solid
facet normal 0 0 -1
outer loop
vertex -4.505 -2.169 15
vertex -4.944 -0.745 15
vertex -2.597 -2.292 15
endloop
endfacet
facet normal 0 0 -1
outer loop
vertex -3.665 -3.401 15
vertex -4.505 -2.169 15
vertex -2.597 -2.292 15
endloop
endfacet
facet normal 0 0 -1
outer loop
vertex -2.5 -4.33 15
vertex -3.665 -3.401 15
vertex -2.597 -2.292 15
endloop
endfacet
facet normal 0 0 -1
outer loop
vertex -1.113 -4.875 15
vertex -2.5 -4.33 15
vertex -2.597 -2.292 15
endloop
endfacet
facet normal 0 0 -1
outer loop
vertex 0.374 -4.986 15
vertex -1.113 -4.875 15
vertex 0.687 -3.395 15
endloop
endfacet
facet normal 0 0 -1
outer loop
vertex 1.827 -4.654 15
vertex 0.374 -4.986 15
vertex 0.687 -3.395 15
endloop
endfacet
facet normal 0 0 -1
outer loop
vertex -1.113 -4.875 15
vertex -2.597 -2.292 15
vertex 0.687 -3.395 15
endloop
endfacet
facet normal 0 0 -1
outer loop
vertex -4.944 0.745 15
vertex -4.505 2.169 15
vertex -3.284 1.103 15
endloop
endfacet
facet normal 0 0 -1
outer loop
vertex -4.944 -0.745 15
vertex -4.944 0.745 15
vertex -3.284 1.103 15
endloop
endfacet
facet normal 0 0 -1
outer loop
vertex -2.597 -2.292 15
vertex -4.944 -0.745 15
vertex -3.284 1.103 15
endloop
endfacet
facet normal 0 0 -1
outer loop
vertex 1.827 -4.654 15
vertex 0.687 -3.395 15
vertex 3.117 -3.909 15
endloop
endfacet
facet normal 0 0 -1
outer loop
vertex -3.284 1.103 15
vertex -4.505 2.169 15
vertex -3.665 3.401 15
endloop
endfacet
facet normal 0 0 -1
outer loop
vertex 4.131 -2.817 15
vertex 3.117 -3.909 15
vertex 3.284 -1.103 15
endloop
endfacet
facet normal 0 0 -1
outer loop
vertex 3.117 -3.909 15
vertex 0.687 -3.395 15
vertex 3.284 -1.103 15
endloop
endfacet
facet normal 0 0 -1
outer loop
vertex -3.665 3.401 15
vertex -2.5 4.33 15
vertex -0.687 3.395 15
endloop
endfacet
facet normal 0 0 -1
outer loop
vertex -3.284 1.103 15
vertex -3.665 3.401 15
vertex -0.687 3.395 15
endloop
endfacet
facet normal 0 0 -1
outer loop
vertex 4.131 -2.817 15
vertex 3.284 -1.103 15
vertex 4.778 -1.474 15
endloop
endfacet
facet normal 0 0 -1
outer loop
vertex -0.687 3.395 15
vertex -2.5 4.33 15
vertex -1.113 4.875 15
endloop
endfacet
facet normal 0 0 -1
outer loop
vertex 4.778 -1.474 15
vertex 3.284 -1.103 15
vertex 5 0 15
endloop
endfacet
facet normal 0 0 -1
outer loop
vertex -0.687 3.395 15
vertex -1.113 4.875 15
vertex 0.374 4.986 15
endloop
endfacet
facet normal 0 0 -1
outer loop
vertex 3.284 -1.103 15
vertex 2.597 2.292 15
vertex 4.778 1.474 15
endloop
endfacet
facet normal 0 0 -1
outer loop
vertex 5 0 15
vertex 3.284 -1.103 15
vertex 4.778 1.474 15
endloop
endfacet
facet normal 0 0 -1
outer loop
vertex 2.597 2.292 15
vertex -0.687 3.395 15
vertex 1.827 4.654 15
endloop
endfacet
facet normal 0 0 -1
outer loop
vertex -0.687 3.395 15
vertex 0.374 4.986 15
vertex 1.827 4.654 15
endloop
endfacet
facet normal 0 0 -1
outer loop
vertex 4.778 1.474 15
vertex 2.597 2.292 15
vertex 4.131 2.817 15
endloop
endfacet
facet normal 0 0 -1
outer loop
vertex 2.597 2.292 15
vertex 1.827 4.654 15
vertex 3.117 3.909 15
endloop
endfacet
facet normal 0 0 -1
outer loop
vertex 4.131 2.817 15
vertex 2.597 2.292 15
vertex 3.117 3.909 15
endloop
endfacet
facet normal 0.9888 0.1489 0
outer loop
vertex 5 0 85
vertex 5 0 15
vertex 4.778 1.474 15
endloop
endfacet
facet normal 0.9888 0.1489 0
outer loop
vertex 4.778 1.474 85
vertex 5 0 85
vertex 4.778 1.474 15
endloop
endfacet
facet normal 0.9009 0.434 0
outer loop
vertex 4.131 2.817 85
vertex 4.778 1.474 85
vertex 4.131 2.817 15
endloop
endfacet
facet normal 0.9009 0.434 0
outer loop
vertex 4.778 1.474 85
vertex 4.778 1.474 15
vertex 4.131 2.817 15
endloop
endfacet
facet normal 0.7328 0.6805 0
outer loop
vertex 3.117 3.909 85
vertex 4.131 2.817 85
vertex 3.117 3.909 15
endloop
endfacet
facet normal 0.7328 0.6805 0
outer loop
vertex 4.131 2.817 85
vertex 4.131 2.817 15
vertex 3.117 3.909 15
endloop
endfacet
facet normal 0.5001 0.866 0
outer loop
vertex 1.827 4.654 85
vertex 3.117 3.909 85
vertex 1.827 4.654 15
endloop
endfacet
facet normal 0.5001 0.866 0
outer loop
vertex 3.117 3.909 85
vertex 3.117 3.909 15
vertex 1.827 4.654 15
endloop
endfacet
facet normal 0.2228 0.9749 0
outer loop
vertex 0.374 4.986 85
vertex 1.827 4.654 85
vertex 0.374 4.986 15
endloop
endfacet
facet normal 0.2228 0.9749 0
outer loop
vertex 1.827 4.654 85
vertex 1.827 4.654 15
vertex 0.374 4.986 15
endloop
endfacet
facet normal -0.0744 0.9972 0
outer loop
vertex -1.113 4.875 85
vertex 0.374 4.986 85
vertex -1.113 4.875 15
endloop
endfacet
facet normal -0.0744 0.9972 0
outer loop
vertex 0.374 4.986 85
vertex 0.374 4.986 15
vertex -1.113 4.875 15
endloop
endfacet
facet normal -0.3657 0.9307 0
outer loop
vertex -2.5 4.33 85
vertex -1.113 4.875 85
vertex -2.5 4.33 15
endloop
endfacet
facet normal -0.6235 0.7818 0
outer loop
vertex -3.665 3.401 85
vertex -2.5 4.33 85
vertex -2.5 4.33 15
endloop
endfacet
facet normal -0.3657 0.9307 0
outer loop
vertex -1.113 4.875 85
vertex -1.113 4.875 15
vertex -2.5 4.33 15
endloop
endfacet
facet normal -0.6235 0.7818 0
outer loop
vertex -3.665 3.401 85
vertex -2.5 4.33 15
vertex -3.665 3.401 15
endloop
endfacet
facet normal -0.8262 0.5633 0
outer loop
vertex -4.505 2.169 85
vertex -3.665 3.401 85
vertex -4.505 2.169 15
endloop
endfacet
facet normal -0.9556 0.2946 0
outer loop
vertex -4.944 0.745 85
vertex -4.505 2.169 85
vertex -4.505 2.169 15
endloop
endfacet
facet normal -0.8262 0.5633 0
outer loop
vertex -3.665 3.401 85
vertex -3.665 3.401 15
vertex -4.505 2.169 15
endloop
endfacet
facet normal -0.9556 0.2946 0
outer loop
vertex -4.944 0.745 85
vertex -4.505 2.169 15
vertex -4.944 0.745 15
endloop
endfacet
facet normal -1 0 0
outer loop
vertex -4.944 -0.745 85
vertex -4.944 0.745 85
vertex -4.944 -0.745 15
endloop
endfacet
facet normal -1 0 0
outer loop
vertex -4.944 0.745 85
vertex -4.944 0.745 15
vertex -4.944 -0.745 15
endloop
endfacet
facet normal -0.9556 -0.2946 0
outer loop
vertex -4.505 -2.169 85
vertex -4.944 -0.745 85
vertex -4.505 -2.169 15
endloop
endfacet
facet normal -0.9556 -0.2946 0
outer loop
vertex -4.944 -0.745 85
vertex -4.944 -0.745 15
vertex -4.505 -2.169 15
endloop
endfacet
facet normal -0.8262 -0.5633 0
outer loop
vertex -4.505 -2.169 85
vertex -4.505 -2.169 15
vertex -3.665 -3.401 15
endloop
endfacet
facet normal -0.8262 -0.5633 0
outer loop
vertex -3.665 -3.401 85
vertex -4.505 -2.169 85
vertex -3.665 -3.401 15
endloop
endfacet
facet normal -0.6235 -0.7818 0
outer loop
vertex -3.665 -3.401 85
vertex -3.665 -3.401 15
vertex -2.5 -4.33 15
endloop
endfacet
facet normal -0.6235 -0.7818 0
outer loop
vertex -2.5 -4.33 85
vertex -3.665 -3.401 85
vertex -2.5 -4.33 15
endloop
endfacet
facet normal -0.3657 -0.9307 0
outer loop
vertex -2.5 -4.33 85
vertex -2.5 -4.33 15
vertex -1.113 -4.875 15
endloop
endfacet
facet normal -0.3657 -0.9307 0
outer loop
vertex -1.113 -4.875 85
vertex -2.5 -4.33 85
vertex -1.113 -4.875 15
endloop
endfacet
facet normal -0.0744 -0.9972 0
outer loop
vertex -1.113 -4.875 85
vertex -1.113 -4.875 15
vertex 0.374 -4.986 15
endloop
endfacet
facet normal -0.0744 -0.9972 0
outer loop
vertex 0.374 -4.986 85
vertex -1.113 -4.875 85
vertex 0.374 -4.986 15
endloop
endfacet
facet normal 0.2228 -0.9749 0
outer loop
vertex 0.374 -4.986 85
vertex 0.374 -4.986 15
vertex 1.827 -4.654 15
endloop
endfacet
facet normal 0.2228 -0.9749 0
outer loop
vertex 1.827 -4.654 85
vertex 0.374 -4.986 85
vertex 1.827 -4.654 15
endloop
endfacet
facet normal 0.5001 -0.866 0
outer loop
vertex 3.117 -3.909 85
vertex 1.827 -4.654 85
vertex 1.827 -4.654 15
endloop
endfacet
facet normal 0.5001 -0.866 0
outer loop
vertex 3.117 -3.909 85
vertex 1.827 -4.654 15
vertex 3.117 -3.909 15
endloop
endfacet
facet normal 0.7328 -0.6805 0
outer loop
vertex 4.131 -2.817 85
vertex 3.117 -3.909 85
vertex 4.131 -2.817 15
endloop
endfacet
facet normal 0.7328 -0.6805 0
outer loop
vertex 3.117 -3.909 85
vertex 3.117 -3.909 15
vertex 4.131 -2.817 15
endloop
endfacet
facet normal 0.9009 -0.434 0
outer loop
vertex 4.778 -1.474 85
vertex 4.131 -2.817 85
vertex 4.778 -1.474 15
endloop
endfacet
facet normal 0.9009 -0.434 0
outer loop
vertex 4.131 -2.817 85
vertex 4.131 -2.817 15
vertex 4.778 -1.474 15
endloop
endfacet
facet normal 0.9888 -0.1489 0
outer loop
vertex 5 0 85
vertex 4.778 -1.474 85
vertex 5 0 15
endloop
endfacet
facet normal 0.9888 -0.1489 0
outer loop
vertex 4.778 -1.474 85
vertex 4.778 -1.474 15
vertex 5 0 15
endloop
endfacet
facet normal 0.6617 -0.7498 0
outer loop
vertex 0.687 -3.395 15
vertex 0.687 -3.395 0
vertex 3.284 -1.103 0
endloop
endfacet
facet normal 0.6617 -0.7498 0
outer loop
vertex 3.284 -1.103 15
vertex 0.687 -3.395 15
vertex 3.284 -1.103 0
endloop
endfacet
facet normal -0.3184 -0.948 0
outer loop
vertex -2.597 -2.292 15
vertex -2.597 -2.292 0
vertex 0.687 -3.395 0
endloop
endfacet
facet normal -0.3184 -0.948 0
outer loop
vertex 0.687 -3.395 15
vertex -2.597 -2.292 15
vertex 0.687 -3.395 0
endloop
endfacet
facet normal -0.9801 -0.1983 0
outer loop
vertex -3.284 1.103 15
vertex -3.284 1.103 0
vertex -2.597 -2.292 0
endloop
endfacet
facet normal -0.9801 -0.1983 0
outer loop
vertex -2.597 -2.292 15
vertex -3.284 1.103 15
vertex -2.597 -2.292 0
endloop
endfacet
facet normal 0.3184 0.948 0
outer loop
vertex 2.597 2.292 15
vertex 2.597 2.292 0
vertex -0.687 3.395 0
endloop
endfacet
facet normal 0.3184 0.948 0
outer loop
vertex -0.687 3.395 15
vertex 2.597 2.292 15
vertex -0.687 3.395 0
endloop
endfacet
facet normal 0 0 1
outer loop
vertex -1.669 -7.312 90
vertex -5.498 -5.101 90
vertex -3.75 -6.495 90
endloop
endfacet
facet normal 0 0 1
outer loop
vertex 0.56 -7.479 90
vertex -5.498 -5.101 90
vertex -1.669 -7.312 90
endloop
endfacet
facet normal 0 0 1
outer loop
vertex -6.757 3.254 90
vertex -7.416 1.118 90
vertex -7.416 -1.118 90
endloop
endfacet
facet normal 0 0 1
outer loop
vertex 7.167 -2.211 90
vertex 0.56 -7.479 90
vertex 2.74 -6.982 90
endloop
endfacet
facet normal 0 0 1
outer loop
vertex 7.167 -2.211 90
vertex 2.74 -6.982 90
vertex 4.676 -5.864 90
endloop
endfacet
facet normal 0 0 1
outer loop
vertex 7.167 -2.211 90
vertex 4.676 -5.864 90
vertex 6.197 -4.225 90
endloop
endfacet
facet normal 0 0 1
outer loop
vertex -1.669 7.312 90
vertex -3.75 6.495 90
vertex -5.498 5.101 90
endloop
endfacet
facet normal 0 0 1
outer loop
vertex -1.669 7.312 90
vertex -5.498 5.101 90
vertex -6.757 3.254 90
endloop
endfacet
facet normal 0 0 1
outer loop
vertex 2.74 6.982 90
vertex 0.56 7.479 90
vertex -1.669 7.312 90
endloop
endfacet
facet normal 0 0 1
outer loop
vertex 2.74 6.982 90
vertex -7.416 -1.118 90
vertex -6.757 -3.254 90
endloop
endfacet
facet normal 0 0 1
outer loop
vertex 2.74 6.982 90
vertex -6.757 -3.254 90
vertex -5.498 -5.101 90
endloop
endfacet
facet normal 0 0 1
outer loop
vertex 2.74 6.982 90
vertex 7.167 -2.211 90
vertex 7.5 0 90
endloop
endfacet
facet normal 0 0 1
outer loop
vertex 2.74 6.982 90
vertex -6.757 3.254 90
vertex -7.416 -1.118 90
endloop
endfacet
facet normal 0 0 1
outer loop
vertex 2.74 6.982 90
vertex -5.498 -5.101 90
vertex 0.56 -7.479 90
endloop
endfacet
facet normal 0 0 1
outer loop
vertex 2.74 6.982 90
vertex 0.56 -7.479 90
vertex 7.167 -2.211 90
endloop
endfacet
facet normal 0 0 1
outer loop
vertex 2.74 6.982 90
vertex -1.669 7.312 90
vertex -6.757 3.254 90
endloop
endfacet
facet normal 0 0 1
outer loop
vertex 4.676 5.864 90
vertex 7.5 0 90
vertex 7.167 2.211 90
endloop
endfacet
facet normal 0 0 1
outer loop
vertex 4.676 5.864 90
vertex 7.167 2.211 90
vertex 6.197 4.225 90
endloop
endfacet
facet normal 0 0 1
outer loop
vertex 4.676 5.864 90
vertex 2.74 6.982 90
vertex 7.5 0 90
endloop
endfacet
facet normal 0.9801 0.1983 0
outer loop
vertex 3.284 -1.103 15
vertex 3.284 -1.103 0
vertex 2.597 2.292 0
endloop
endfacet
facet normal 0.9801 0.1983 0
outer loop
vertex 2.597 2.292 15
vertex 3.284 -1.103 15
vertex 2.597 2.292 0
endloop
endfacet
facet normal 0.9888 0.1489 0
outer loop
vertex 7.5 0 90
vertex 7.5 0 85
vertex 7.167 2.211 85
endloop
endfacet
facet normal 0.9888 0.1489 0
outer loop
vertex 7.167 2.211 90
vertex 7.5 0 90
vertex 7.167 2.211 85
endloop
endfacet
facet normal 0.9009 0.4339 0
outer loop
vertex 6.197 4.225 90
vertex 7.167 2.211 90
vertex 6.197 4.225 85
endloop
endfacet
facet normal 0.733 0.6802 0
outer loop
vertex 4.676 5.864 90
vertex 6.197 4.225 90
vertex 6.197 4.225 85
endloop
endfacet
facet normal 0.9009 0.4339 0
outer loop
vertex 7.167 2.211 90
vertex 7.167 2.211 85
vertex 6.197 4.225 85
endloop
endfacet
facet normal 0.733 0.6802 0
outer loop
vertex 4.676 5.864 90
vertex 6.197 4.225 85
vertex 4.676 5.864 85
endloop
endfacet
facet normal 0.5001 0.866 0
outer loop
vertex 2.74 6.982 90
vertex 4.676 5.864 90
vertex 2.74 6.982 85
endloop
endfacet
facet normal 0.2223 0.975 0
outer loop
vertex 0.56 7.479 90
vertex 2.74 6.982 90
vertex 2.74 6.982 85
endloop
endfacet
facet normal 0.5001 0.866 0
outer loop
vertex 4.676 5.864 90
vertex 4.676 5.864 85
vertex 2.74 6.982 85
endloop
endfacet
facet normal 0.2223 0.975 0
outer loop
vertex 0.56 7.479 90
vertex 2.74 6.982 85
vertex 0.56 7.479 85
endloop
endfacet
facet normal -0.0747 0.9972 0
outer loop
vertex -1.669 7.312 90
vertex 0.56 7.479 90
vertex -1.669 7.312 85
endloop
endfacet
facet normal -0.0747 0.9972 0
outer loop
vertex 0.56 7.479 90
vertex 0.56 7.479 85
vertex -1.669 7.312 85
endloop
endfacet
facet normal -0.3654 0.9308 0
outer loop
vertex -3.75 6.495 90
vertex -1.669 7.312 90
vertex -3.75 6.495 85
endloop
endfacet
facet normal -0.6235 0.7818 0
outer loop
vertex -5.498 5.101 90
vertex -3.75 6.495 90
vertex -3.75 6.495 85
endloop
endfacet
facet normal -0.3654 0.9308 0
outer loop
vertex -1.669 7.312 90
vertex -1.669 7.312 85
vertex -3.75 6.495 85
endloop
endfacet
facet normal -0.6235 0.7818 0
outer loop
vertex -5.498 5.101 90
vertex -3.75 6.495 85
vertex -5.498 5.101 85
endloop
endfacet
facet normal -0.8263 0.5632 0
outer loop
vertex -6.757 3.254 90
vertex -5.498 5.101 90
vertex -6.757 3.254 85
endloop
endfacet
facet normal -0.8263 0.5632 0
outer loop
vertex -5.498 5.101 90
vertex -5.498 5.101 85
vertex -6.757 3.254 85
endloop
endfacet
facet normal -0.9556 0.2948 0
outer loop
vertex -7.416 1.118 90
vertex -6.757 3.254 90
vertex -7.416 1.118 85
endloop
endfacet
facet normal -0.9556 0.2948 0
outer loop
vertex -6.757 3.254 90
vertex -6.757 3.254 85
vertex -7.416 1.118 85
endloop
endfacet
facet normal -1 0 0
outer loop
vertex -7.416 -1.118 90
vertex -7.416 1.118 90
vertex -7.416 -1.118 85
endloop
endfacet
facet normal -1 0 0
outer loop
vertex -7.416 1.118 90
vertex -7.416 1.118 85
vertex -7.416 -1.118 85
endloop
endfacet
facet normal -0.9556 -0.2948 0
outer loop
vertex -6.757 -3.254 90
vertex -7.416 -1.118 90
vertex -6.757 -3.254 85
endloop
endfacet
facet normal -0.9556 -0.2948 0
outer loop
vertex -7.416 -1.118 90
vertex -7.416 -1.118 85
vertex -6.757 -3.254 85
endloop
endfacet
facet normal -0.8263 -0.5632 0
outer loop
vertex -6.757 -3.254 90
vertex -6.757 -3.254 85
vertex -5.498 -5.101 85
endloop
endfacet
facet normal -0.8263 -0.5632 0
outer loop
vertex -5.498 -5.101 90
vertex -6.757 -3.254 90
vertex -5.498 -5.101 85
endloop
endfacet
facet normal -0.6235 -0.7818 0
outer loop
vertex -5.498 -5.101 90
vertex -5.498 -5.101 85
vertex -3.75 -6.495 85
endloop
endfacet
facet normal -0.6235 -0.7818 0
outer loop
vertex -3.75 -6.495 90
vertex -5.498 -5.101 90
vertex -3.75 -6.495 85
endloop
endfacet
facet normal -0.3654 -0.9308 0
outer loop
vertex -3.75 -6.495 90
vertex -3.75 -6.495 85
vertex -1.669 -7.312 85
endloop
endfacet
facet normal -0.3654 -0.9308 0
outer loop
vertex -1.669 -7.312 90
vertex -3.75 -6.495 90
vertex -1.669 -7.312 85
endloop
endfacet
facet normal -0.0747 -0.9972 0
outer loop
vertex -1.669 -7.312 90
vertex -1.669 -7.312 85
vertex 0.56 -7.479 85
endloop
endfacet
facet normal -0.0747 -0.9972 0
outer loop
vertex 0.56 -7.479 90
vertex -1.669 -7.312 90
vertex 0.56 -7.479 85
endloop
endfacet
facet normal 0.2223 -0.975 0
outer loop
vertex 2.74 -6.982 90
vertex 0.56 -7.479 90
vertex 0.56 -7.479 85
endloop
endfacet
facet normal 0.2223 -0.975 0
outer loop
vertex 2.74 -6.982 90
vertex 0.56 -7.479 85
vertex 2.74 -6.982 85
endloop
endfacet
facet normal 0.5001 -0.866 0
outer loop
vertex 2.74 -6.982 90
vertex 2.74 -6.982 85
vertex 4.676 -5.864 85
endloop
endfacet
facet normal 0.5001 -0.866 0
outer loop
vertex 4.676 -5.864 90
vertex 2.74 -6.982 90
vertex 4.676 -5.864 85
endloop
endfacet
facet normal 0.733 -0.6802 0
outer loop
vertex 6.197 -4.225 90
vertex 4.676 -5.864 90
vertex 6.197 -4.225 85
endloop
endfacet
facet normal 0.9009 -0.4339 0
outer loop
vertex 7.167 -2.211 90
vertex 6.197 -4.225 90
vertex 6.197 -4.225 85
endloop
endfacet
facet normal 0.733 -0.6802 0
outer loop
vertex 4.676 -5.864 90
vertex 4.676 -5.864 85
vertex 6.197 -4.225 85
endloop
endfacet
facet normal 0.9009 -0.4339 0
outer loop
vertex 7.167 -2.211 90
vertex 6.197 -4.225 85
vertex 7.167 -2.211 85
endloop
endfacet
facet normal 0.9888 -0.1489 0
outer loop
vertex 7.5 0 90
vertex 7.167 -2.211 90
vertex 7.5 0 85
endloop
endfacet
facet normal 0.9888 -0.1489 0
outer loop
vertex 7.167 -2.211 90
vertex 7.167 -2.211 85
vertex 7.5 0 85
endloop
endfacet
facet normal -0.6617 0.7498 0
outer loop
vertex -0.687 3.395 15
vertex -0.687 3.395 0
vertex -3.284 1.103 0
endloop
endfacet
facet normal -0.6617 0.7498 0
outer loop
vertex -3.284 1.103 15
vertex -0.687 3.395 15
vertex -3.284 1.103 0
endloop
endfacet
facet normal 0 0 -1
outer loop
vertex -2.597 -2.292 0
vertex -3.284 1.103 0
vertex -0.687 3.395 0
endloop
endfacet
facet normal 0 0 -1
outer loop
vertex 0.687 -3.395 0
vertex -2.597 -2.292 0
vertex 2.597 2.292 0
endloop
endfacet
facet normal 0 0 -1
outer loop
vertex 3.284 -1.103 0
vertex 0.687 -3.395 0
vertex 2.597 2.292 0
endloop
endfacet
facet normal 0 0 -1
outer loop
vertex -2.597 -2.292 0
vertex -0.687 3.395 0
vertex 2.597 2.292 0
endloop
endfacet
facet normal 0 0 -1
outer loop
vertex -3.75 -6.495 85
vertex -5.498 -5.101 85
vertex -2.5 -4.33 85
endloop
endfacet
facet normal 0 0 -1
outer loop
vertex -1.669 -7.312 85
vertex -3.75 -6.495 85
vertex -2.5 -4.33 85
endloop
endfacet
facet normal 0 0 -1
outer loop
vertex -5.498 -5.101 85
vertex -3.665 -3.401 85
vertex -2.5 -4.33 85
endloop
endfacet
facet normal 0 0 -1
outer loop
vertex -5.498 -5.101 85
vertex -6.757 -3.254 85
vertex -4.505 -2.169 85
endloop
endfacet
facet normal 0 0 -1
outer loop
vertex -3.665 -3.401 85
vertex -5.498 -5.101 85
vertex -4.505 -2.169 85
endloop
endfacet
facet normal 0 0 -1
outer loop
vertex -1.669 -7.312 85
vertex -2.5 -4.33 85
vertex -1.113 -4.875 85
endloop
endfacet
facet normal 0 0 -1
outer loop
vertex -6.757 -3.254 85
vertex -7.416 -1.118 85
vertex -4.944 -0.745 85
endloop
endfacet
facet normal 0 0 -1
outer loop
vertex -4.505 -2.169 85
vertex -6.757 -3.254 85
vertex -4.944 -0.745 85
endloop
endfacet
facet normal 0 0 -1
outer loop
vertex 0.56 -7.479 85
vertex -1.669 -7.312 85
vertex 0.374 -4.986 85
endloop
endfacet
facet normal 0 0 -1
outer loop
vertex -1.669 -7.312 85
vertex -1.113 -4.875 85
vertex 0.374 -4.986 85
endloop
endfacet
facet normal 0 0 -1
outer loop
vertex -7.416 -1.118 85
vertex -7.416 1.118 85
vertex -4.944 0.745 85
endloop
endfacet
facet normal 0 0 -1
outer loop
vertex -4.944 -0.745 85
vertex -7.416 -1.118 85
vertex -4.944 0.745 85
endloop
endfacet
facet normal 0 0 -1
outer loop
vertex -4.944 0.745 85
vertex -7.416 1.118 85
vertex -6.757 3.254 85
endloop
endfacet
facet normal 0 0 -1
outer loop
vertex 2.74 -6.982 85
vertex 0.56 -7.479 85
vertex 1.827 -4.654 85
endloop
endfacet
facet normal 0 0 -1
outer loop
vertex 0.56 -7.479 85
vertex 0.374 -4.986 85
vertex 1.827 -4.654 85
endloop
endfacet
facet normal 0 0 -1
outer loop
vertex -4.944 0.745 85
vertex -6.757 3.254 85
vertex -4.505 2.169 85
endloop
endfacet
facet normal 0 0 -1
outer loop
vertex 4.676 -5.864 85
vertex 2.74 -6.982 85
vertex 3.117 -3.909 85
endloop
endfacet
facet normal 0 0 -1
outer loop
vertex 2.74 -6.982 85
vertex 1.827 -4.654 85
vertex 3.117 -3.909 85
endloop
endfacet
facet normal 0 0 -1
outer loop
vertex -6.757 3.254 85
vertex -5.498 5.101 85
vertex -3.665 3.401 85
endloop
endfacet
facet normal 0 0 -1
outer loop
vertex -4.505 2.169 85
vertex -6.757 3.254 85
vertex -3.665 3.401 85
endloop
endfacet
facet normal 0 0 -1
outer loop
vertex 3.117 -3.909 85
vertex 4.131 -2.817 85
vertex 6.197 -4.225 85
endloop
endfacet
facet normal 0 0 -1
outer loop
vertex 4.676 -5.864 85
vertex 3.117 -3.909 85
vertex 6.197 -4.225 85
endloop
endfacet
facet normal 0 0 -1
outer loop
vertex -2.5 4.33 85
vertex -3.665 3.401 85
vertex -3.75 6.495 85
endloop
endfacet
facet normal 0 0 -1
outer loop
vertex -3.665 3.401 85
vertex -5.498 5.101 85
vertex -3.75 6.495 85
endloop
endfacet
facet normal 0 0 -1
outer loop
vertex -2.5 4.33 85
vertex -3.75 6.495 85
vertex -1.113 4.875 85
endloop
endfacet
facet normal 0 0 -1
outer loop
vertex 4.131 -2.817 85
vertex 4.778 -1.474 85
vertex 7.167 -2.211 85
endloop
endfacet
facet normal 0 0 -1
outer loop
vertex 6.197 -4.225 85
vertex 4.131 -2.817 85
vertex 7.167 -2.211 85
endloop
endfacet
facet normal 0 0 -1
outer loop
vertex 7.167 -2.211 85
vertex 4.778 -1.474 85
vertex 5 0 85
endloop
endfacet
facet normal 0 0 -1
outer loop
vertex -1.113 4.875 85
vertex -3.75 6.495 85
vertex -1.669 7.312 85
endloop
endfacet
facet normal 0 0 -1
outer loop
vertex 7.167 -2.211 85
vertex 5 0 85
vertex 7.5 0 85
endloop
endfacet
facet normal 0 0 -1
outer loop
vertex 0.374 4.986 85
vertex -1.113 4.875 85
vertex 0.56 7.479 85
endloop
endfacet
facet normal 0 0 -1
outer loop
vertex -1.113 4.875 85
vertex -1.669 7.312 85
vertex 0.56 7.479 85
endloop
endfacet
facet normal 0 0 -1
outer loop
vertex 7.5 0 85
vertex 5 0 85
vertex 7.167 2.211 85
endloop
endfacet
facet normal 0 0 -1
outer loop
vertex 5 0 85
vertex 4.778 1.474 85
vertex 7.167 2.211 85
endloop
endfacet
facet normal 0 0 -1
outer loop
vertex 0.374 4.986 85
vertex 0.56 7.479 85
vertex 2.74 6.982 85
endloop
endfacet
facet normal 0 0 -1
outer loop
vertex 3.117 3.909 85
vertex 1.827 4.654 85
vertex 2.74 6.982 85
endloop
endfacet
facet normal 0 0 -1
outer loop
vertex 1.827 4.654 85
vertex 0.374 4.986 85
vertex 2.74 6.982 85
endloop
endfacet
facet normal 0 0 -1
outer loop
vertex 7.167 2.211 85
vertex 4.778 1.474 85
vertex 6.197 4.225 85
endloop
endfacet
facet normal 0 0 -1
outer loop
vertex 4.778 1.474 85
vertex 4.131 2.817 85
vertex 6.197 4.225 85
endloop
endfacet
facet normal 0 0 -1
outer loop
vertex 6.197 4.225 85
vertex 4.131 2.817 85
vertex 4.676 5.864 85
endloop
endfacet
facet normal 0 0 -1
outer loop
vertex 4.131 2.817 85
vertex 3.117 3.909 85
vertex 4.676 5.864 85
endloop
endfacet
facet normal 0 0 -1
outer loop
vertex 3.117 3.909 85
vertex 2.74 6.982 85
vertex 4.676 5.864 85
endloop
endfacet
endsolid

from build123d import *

# Parameters (mm, degrees)
BOSS_EXTRU_1_DEPTH = 15
ESQUISSE2_R        = 5
BOSS_EXTRU_2_DEPTH = 70
ESQUISSE3_R        = 7.5
BOSS_EXTRU_3_DEPTH = 5


with BuildPart() as part:
    # Esquisse1 → Boss.-Extru.1 (new body)
    with BuildSketch(Plane.XY):
        Polygon((-0.686649648, 3.395366293), (-3.283798289, 1.103027108), (-2.597148641, -2.292339185), (0.686649648, -3.395366293), (3.283798289, -1.103027108), (2.597148641, 2.292339185), align=None)
    extrude(amount=BOSS_EXTRU_1_DEPTH)

    # Esquisse2 → Boss.-Extru.2 (add)
    with BuildSketch(Plane.XY.offset(15)):
        Circle(ESQUISSE2_R)
    extrude(amount=BOSS_EXTRU_2_DEPTH)

    # Esquisse3 → Boss.-Extru.3 (add)
    with BuildSketch(Plane.XY.offset(85)):
        Circle(ESQUISSE3_R)
    extrude(amount=BOSS_EXTRU_3_DEPTH)


solid = part.part
